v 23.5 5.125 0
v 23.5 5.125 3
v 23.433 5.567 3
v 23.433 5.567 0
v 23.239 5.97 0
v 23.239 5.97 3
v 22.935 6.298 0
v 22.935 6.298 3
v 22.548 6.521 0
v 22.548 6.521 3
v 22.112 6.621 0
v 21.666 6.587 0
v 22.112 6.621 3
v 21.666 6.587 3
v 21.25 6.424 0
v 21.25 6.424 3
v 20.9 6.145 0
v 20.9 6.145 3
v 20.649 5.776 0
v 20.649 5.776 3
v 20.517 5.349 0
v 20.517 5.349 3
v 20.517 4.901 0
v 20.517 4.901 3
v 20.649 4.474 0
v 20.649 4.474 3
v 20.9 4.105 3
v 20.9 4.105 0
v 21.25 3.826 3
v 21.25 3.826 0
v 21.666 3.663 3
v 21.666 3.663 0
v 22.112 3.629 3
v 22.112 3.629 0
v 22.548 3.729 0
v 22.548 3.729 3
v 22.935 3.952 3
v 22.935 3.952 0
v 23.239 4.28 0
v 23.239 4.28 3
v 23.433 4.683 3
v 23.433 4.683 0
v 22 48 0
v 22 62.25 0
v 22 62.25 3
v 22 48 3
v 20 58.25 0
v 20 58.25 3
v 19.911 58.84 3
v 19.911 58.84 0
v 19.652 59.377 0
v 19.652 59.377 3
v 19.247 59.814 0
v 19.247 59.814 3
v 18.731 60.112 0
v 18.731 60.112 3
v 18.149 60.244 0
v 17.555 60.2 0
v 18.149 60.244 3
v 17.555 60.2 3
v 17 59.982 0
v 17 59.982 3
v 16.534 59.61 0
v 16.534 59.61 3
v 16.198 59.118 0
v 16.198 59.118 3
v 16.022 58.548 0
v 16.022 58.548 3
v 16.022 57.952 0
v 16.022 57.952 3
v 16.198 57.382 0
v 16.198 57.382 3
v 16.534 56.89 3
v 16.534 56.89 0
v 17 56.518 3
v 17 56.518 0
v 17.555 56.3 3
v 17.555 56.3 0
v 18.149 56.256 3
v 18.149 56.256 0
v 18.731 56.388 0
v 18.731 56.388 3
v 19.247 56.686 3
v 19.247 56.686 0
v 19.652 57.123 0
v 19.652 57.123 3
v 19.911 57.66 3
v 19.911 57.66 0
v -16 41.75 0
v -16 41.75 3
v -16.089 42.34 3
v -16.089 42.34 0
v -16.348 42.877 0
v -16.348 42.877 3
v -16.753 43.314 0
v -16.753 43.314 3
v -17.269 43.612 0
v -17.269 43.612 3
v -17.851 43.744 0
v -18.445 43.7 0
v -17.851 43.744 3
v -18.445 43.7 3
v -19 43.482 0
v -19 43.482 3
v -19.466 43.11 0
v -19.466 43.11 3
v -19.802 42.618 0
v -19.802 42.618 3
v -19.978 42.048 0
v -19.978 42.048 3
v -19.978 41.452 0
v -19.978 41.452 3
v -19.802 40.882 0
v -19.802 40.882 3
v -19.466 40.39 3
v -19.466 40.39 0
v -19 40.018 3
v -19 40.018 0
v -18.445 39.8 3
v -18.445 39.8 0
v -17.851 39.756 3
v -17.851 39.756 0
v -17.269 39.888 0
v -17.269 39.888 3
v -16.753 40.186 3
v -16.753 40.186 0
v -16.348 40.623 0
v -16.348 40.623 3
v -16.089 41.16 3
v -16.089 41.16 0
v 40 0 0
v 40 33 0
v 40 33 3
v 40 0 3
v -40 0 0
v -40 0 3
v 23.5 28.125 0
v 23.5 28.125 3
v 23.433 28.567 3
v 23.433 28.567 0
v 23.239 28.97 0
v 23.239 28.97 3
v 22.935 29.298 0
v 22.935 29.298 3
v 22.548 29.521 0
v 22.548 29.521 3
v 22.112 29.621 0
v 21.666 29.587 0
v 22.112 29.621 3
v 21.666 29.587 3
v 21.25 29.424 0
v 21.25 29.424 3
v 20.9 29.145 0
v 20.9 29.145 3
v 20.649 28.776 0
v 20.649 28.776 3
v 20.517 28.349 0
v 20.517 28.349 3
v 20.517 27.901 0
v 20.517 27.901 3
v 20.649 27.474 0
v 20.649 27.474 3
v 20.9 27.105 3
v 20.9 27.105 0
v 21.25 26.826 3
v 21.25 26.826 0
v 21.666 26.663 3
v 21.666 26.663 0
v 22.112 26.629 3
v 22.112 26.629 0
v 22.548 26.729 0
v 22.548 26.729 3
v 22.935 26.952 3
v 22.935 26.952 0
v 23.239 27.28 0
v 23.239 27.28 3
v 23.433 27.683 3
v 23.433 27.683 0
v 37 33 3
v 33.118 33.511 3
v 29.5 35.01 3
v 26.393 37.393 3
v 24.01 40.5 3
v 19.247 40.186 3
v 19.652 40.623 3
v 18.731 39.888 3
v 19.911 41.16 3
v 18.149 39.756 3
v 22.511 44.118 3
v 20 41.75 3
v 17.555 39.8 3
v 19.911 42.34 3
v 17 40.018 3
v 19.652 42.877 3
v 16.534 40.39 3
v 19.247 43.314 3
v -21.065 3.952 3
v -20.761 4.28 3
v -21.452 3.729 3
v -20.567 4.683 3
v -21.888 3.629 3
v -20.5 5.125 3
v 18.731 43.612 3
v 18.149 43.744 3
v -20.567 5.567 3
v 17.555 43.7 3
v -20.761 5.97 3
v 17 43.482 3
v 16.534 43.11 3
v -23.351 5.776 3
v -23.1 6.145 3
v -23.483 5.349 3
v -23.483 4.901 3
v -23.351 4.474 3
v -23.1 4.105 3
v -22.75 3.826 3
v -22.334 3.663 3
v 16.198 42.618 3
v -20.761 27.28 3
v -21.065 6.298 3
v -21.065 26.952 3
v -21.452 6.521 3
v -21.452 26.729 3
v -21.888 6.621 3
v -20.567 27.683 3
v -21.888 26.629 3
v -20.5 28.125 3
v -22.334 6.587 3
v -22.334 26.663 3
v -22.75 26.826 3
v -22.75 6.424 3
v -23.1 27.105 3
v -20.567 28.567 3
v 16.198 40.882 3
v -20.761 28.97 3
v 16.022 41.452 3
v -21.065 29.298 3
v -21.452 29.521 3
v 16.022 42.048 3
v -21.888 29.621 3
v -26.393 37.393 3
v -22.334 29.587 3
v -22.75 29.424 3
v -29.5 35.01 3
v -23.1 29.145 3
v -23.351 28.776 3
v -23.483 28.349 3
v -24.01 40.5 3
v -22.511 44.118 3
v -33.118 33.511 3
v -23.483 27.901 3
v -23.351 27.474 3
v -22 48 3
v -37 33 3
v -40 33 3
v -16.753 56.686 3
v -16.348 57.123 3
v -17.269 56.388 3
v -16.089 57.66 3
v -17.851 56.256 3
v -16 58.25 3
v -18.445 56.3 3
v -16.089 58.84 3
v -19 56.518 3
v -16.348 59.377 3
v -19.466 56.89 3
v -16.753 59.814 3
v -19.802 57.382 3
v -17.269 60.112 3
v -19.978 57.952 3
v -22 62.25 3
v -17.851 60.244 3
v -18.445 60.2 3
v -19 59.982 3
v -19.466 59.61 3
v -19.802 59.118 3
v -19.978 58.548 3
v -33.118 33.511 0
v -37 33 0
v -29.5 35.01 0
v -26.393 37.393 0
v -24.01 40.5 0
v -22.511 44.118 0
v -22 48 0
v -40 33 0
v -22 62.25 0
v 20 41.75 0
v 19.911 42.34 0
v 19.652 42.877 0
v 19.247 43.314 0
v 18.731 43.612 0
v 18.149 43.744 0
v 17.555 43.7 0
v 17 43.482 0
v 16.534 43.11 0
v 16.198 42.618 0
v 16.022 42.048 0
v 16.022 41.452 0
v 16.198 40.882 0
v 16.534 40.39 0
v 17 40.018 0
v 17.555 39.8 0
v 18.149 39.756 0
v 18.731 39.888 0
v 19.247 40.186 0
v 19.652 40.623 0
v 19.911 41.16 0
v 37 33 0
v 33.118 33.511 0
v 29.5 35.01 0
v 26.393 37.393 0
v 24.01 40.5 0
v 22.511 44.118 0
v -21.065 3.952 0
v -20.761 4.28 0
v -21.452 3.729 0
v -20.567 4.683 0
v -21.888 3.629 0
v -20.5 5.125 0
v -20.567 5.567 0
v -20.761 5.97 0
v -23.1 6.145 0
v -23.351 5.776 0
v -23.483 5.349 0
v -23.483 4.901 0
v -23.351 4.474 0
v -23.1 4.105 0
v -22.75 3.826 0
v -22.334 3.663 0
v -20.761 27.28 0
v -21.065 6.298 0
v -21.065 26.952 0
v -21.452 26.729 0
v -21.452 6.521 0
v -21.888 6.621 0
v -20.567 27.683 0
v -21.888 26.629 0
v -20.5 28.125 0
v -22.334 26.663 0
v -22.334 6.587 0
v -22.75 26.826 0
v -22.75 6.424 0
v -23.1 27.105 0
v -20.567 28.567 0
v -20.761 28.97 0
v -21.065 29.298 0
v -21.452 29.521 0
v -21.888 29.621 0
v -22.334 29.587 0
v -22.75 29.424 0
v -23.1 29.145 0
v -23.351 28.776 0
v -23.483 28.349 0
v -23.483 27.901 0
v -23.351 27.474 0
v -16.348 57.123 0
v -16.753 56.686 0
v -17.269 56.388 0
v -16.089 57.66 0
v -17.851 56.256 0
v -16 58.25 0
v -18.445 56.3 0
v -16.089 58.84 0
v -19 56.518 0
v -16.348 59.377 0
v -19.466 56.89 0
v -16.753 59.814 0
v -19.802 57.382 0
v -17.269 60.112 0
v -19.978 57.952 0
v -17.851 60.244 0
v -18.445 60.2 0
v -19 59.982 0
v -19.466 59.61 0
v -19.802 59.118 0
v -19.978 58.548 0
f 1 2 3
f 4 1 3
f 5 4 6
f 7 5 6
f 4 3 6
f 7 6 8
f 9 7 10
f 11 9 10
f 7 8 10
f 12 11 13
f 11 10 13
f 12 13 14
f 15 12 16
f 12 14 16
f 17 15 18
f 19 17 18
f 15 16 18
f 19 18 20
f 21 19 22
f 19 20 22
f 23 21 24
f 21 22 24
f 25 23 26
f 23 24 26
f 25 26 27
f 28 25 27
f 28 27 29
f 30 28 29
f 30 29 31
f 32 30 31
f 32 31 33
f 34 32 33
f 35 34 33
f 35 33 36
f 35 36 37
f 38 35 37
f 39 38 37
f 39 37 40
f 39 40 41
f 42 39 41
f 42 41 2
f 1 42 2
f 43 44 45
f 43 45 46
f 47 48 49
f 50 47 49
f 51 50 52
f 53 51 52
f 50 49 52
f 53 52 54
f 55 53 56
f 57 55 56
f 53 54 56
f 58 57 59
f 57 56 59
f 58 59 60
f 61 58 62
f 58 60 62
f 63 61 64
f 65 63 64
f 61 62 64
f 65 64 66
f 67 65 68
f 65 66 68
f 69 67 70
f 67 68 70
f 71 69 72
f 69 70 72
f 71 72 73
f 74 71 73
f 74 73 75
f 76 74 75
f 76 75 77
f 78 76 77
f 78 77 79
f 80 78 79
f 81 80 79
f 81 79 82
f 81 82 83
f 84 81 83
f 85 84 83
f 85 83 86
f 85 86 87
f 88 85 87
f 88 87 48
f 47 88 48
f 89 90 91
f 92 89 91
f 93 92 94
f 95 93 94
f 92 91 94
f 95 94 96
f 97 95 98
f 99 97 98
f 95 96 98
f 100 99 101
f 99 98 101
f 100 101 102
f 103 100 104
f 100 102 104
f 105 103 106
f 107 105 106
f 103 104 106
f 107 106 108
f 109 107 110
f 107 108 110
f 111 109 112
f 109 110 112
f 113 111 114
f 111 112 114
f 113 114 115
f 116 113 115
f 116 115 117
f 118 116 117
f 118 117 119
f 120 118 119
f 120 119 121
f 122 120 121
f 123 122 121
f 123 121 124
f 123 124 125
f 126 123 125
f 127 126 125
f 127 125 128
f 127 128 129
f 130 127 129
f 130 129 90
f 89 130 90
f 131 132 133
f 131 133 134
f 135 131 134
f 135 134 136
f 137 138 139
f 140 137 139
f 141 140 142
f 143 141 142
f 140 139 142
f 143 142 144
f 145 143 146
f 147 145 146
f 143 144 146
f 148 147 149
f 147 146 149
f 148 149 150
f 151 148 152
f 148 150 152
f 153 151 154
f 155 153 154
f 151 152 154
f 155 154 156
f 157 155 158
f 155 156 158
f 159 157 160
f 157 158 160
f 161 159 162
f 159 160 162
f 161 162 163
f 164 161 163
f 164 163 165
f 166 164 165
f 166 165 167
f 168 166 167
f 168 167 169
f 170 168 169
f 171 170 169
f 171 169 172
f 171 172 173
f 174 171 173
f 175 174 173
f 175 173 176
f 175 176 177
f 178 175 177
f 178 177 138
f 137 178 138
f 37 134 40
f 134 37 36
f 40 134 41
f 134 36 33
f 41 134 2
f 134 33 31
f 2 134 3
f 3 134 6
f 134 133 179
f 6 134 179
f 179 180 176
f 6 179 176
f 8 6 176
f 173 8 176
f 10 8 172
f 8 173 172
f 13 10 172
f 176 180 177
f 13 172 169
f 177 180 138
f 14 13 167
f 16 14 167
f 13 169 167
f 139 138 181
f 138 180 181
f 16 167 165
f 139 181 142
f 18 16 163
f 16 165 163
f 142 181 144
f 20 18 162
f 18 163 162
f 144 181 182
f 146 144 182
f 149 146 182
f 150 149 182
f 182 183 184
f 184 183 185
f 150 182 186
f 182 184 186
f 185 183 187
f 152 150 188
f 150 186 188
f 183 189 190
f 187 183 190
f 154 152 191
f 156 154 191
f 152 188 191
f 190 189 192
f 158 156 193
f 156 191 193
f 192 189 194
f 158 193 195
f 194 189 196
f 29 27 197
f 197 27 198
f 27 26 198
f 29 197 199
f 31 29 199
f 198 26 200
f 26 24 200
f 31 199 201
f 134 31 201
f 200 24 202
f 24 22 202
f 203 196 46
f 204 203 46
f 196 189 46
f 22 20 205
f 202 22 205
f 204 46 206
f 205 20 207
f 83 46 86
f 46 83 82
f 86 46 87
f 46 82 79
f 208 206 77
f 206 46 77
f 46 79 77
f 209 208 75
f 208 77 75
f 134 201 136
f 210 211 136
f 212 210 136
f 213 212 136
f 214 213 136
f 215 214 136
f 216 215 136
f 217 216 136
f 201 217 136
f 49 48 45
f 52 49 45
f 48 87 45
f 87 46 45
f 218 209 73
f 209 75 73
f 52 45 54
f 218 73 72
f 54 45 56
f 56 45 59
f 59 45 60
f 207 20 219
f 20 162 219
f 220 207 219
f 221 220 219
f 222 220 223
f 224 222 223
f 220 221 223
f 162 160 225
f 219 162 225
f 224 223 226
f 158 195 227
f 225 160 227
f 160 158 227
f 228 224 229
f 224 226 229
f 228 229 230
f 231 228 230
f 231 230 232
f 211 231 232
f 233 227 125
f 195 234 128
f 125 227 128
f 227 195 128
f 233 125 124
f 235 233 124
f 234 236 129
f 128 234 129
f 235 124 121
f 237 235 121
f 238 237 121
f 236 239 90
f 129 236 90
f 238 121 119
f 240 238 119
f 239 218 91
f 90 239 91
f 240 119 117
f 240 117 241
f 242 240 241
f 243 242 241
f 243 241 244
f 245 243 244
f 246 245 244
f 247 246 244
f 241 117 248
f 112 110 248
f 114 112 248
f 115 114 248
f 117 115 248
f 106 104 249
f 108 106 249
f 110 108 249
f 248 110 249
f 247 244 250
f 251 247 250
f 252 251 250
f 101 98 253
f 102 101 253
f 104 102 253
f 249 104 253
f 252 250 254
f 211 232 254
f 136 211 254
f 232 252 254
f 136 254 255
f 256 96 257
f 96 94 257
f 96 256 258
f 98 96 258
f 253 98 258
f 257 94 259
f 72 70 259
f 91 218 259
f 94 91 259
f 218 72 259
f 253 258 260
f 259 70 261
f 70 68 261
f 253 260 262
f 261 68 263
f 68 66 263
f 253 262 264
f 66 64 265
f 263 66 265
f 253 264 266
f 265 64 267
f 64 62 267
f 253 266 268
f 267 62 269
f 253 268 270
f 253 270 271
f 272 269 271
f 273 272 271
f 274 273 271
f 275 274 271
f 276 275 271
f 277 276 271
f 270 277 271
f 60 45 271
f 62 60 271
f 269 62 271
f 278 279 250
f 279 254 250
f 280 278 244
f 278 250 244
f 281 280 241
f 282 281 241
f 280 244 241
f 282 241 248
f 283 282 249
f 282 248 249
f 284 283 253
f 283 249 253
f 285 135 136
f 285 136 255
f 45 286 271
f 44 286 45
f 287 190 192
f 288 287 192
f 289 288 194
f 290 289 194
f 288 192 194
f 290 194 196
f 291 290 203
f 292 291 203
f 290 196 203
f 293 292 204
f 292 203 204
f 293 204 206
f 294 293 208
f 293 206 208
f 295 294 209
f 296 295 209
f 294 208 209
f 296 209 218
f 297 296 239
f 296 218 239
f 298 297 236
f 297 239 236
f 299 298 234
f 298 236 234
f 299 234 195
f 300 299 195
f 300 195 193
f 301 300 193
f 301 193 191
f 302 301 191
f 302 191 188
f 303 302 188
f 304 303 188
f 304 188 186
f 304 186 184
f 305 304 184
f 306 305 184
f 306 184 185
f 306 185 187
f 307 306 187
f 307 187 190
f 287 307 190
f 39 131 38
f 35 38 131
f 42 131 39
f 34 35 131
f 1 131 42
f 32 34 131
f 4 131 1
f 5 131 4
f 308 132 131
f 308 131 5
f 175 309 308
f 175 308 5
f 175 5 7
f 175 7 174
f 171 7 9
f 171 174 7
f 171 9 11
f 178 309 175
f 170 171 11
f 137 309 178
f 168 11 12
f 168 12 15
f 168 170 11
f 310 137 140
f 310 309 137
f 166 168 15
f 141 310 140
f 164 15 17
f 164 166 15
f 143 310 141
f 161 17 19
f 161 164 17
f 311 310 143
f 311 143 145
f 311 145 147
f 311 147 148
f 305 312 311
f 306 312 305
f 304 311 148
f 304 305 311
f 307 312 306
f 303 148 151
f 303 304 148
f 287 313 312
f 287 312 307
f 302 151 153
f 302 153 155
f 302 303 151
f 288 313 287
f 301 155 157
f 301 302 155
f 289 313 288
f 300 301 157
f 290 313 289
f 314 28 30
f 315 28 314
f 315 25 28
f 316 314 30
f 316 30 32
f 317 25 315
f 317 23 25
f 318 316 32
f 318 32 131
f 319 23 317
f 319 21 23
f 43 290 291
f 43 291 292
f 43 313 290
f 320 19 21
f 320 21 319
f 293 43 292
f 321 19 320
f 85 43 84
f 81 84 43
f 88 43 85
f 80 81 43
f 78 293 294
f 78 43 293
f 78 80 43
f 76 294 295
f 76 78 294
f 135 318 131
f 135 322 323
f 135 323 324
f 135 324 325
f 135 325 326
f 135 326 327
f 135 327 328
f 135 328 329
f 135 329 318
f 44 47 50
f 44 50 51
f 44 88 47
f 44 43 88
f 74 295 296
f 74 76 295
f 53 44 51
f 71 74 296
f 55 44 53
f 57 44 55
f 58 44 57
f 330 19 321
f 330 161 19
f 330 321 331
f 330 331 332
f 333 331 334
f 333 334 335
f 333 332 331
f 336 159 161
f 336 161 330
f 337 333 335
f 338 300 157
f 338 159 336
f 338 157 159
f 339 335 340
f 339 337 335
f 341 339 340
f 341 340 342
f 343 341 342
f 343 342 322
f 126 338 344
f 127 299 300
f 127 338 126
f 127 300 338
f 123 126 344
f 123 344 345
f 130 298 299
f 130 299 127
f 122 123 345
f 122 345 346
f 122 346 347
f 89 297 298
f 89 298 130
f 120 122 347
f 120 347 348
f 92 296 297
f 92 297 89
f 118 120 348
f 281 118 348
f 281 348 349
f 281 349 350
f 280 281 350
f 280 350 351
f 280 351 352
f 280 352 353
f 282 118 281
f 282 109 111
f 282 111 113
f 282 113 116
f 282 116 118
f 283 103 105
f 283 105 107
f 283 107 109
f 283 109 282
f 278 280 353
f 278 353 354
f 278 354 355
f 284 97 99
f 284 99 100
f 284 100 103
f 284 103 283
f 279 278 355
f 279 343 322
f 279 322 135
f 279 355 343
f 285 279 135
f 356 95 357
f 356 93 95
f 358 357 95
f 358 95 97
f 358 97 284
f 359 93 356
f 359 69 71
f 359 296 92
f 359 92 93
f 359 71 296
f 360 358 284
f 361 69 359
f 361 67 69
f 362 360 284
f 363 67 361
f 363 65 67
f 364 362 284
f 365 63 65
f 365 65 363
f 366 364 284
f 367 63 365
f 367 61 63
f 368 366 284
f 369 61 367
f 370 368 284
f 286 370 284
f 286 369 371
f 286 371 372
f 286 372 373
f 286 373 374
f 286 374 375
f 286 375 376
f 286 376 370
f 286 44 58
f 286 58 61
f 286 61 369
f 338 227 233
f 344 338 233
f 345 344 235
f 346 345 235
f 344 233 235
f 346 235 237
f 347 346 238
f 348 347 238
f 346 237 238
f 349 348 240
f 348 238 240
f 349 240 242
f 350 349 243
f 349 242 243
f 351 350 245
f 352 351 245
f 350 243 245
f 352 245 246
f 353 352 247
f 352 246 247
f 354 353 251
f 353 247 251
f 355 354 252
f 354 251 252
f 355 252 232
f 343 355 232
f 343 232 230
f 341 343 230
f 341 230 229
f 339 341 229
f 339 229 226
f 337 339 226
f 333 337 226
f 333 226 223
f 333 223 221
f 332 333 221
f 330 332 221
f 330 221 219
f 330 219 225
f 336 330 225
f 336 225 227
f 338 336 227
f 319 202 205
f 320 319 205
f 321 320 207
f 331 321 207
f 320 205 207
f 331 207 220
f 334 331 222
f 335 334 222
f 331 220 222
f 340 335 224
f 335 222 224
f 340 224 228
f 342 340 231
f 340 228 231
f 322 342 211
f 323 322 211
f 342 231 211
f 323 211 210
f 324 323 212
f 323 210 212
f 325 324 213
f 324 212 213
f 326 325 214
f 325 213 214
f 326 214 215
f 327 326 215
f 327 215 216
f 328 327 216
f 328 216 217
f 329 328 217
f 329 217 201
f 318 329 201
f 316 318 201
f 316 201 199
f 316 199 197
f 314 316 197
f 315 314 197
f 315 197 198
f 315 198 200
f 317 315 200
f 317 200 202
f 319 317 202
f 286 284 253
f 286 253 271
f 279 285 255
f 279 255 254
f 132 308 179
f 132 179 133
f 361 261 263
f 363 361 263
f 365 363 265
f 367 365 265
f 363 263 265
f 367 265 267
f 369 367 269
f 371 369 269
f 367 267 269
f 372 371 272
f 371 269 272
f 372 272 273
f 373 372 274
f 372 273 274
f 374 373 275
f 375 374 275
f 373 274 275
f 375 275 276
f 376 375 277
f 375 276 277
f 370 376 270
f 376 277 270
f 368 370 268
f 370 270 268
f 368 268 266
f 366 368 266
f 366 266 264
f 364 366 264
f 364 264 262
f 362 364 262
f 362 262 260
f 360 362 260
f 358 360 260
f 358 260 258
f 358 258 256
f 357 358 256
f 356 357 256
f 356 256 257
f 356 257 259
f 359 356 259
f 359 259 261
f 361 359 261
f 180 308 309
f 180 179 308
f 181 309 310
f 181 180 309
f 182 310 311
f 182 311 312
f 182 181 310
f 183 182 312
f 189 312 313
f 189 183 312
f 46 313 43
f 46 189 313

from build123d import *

# Parameters (mm, degrees)
EXTRUDE_1_DEPTH     = 3
SKETCH_2_R          = 2
CUT_EXTRUDE_1_DEPTH = 75.054456314
SKETCH_3_R          = 1.5
CUT_EXTRUDE_2_DEPTH = 75.054456314
FILLET_1_R          = 15


with BuildPart() as part:
    # 草图1 → 凸台-拉伸1 (new body)
    with BuildSketch(Plane.XY):
        Polygon((40, 0), (-40, 0), (-40, 33), (-22, 33), (-22, 62.25), (22, 62.25), (22, 33), (40, 33), align=None)
    extrude(amount=EXTRUDE_1_DEPTH)

    # 草图2 → 切除-拉伸1 (cut, through all)
    with BuildSketch(Plane.XY.offset(3)):
        with Locations((-18, 58.25)):
            Circle(SKETCH_2_R)
        with Locations((-18, 41.75)):
            Circle(SKETCH_2_R)
        with Locations((18, 41.75)):
            Circle(SKETCH_2_R)
        with Locations((18, 58.25)):
            Circle(SKETCH_2_R)
    extrude(amount=-CUT_EXTRUDE_1_DEPTH, mode=Mode.SUBTRACT)

    # 草图3 → 切除-拉伸2 (cut, through all)
    with BuildSketch(Plane.XY.offset(3)):
        with Locations((-22, 28.125)):
            Circle(SKETCH_3_R)
        with Locations((22, 28.125)):
            Circle(SKETCH_3_R)
        with Locations((22, 5.125)):
            Circle(SKETCH_3_R)
        with Locations((-22, 5.125)):
            Circle(SKETCH_3_R)
    extrude(amount=-CUT_EXTRUDE_2_DEPTH, mode=Mode.SUBTRACT)

    # 圆角1
    fillet_1_edges = [part.edges().sort_by_distance(p)[0] for p in [
        (-22, 33, 1.5),
        (22, 33, 1.5),
    ]]
    fillet(fillet_1_edges, radius=FILLET_1_R)


solid = part.part
